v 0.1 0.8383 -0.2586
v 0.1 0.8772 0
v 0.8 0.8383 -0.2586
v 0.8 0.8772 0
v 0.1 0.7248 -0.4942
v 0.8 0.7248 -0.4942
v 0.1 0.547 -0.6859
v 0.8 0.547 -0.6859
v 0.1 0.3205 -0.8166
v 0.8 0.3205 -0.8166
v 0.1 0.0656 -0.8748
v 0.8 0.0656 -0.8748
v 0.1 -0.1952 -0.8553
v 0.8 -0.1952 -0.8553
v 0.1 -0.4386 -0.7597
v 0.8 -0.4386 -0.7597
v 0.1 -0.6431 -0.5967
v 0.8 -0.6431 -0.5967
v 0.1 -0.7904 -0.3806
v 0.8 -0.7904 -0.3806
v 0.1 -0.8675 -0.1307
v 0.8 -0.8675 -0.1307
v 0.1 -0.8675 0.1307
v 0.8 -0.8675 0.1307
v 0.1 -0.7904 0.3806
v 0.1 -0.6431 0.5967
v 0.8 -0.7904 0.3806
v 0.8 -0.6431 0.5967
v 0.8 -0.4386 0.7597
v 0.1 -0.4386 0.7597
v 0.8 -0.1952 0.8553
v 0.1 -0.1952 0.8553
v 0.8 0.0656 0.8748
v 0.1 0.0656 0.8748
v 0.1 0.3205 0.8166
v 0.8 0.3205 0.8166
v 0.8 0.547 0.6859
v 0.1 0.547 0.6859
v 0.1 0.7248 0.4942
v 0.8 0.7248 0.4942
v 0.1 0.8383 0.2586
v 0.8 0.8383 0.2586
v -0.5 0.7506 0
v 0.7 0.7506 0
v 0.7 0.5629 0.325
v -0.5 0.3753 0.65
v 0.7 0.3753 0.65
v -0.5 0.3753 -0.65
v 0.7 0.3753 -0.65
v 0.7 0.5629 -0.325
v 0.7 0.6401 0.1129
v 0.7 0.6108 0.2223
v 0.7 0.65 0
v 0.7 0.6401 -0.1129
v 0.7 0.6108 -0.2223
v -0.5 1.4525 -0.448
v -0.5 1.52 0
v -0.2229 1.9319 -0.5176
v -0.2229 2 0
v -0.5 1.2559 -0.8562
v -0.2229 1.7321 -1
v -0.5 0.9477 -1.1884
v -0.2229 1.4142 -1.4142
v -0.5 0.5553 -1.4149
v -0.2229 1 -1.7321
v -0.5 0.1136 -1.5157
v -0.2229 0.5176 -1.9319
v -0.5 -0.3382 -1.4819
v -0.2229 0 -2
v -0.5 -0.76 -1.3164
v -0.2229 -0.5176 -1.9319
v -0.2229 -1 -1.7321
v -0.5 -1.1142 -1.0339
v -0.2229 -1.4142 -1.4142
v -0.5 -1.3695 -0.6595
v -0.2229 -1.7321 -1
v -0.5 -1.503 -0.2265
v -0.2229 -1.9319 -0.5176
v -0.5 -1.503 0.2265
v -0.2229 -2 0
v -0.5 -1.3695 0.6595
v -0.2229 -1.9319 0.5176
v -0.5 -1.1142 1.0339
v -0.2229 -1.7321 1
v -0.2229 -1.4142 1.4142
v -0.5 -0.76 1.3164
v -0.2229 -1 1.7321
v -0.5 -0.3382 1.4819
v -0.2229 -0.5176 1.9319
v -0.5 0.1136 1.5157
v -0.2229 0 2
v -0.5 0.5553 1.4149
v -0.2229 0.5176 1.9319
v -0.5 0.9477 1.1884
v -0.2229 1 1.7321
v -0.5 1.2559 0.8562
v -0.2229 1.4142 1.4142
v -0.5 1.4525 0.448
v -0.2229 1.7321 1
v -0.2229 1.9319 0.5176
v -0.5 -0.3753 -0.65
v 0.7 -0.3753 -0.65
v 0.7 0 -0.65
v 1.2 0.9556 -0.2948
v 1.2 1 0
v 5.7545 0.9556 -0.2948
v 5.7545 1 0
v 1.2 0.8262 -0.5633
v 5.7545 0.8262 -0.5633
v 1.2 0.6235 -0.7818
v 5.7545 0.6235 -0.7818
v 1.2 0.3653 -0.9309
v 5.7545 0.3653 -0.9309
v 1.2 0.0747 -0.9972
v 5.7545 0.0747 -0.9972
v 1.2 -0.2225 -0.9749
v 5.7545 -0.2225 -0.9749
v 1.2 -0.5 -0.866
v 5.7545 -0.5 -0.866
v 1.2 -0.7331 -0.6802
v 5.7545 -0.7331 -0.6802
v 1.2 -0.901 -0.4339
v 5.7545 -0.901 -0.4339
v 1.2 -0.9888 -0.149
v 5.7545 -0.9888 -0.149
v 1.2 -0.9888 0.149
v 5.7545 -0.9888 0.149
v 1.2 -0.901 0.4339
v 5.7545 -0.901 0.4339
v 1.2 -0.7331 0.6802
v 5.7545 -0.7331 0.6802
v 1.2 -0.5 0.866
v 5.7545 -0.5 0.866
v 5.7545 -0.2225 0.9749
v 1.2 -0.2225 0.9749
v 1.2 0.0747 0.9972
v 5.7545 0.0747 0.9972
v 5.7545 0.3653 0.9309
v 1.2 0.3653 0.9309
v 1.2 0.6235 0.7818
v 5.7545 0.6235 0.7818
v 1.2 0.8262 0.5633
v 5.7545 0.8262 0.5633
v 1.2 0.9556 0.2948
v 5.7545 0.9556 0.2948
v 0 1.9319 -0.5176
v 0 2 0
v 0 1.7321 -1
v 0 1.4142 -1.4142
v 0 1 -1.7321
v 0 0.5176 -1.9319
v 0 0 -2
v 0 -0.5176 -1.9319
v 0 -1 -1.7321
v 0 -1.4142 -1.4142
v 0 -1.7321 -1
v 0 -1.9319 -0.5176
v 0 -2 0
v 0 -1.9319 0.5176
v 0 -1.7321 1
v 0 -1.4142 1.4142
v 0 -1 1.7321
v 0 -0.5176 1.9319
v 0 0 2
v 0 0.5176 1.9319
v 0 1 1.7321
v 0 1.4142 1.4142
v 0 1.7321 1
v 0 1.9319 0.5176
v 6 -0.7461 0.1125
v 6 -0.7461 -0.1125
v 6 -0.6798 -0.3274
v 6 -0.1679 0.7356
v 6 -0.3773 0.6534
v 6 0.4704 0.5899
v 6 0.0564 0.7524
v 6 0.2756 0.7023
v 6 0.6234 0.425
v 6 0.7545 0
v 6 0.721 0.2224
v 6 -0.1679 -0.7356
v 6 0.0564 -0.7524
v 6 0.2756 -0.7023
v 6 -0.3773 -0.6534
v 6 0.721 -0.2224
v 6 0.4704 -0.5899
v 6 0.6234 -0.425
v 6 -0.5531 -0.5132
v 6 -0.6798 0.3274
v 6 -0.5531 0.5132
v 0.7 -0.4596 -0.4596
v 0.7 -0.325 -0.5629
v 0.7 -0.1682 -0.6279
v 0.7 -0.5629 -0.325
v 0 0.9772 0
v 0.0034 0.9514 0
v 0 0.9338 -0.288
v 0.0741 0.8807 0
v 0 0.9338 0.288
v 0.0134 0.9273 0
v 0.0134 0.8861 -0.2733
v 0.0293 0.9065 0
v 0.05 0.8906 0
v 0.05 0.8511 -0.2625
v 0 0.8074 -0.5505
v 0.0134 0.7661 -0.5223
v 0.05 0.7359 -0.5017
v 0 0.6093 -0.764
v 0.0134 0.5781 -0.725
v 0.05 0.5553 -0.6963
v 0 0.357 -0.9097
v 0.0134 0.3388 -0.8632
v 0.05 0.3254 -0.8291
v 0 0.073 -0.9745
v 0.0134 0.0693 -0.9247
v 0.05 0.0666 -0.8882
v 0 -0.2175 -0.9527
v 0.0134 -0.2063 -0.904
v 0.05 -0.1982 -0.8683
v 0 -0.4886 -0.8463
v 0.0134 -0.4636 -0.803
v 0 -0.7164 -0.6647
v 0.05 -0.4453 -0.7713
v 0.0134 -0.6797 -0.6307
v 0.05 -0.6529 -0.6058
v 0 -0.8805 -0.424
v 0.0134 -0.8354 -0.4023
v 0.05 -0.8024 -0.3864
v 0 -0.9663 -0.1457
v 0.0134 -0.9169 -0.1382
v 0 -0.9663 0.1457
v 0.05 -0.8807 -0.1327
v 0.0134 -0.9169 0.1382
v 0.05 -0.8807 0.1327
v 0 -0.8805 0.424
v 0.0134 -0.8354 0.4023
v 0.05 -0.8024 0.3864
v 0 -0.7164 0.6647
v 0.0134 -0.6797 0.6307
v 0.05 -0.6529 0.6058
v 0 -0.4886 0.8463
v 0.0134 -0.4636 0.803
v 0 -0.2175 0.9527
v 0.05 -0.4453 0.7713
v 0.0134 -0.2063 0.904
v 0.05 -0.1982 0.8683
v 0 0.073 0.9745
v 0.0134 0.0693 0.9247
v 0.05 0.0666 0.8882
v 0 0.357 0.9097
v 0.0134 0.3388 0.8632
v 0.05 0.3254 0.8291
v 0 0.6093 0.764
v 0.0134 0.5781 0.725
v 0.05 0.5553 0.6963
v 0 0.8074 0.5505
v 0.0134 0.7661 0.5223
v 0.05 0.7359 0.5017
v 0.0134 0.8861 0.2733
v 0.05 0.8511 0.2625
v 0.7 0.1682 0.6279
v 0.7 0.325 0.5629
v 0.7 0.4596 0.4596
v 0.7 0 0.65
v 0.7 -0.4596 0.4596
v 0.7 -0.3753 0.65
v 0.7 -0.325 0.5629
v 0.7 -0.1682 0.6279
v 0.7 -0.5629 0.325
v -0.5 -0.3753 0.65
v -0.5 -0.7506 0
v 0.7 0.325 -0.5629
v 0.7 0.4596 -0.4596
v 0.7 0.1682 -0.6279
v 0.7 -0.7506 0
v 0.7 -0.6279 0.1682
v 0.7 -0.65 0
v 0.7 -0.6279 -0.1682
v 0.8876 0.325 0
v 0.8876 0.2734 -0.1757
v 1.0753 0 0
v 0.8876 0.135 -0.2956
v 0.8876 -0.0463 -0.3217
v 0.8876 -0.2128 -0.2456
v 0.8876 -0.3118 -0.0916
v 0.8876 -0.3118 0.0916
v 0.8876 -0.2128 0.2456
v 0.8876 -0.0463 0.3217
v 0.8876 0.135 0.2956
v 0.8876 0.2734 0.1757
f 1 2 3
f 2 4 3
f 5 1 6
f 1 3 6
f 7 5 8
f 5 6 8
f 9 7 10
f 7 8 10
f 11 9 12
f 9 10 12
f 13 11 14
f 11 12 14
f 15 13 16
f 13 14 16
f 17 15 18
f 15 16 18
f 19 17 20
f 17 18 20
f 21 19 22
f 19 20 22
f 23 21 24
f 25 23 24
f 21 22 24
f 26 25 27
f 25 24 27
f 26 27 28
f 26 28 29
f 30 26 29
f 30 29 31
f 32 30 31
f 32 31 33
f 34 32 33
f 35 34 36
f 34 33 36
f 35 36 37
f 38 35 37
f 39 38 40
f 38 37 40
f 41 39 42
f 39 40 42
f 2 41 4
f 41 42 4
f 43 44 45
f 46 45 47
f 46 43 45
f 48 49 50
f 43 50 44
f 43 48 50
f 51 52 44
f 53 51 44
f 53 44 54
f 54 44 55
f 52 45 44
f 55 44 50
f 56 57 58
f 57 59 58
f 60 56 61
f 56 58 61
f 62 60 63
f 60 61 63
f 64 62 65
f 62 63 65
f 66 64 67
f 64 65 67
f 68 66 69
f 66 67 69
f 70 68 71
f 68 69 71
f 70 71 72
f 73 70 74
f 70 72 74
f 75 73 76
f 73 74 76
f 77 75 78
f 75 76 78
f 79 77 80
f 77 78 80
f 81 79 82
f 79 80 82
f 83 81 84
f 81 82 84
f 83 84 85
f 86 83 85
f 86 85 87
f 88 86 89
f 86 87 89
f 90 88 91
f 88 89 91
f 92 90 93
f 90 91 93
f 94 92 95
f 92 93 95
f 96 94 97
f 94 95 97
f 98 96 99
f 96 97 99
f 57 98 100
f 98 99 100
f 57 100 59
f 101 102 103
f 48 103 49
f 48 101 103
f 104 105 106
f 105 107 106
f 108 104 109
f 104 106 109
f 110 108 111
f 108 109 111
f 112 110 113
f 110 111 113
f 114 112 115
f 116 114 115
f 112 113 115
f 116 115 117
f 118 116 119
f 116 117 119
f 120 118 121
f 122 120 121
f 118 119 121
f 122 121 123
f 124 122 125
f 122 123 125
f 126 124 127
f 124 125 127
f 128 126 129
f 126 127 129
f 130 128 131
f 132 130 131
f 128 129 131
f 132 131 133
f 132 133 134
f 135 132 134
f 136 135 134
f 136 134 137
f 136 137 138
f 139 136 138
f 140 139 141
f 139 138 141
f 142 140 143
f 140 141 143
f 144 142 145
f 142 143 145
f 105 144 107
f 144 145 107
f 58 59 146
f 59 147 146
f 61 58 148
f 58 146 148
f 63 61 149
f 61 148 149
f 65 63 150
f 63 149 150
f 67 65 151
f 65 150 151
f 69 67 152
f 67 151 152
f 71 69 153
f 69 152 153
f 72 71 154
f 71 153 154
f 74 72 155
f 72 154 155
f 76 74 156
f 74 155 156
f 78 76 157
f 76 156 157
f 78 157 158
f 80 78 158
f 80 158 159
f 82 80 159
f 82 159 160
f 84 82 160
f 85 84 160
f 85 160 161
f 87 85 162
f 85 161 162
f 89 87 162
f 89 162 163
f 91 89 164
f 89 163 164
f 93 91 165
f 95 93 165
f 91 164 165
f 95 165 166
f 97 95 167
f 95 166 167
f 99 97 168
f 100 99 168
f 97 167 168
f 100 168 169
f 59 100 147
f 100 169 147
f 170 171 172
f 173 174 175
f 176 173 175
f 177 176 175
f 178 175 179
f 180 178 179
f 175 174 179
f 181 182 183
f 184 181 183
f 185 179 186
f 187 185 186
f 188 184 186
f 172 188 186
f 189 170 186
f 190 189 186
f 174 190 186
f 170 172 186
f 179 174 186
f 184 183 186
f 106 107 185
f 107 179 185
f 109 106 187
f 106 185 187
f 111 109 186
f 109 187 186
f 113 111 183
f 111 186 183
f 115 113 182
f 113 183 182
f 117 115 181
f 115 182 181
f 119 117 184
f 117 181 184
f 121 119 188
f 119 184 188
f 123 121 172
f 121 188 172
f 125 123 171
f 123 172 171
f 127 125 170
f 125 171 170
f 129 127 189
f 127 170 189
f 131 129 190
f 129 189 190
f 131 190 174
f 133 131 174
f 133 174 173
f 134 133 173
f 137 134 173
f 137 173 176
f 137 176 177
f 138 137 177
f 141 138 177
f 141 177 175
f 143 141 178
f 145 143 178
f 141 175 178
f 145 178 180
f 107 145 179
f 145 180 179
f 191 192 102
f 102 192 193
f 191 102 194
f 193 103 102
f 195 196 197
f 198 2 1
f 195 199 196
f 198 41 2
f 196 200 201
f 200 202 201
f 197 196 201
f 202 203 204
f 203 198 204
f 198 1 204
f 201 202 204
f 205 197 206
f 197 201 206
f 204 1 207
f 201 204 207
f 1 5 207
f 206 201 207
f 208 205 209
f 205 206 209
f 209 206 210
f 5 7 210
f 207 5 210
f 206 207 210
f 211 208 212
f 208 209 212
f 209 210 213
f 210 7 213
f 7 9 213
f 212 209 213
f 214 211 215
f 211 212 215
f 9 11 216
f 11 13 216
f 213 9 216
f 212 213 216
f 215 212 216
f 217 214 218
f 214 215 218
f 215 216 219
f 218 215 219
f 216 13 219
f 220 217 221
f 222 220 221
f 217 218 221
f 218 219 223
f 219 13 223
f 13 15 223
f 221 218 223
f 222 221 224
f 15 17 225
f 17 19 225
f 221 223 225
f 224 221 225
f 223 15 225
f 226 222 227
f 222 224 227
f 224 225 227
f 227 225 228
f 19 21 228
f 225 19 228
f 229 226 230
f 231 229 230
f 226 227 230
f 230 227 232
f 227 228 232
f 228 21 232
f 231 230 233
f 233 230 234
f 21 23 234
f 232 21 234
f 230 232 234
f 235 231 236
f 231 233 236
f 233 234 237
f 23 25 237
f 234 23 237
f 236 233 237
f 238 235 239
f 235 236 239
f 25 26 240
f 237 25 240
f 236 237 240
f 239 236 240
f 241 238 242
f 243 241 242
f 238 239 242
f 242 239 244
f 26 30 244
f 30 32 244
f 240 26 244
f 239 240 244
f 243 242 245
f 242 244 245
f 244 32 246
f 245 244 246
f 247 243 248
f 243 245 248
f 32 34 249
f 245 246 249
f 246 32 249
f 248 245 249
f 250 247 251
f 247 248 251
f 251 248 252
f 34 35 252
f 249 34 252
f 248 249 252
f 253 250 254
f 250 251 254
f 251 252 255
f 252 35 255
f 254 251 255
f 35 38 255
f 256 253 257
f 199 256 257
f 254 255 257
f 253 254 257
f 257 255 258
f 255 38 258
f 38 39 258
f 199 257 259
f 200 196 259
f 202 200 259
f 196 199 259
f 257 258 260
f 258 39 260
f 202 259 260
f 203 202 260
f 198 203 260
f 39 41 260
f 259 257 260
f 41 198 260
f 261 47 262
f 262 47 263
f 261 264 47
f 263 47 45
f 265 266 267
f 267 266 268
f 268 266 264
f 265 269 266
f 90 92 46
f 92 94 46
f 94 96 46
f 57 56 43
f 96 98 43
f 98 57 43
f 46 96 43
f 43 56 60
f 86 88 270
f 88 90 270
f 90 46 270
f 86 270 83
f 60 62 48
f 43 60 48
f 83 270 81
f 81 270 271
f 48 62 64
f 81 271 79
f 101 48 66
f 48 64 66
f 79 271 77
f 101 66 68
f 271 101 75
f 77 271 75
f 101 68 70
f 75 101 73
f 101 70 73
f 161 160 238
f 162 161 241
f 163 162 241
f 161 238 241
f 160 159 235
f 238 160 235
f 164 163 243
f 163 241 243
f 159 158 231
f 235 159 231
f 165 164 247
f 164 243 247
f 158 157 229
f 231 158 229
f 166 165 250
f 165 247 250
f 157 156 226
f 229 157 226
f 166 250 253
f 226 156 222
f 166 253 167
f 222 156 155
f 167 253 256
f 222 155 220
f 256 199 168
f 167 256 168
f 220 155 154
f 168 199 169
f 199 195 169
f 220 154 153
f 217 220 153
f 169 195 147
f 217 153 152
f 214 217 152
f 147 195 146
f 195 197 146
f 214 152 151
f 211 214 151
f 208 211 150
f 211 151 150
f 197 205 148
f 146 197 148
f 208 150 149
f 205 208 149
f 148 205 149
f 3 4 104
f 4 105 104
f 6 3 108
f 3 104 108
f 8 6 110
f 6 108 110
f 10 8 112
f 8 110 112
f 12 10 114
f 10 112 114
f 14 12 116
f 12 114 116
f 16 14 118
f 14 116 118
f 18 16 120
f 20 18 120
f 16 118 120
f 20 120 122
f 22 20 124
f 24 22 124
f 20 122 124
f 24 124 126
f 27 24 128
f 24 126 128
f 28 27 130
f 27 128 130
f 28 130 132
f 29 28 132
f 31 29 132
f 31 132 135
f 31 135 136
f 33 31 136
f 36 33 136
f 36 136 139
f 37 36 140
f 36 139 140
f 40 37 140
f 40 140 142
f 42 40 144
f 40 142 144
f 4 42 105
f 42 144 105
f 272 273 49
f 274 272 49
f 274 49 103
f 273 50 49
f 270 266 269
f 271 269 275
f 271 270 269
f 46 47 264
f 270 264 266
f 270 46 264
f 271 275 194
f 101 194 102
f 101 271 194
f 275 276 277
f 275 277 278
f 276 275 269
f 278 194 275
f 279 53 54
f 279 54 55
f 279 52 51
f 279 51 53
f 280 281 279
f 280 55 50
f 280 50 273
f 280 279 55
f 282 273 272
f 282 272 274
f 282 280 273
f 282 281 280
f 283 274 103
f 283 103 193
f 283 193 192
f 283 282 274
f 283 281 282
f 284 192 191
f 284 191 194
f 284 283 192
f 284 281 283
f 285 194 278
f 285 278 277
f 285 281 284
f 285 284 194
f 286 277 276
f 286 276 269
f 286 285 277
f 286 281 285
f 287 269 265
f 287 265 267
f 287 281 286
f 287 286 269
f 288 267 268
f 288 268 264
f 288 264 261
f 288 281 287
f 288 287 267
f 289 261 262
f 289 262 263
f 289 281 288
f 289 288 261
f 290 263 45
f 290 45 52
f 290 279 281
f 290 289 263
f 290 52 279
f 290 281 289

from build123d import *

# Parameters (mm, degrees)
CUT_EXTRUDE1_DEPTH = 1.2


with BuildPart() as part:
    # Sketch1 → Revolve1 (revolve)
    with BuildSketch(Plane.XY):
        with BuildLine():
            Line((-0.5, 0), (-0.5, 1.52))
            Line((-0.5, 1.52), (-0.222871871, 2))
            Line((-0.222871871, 2), (0, 2))
            Line((0, 2), (0, 0.97725))
            ThreePointArc((0, 0.97725), (0.029289322, 0.906539322), (0.1, 0.87725))
            Line((0.1, 0.87725), (0.8, 0.87725))
            Line((0.8, 0.87725), (1.2, 1))
            Line((1.2, 1), (5.7545, 1))
            Line((5.7545, 1), (6, 0.7545))
            Line((6, 0.7545), (6, 0))
            Line((6, 0), (-0.5, 0))
        make_face()
    revolve(axis=Axis((6, 0, 0), (-1, 0, 0)))

    # Sketch2 → Cut-Revolve1 (revolve, cut)
    with BuildSketch(Plane.XY):
        Polygon((-0.5, 0), (-0.5, 0.65), (0.7, 0.65), (1.075277675, 0), align=None)
    revolve(axis=Axis((1.075277675, 0, 0), (-1, 0, 0)), mode=Mode.SUBTRACT)

    # Sketch3 → Cut-Extrude1 (cut)
    with BuildSketch(Plane(origin=(-0.5, 0, 0), x_dir=(0, 0, -1), z_dir=(1, 0, 0))):
        Polygon((-0.65, -0.375277675), (0, -0.75055535), (0.65, -0.375277675), (0.65, 0.375277675), (0, 0.75055535), (-0.65, 0.375277675), align=None)
    extrude(amount=CUT_EXTRUDE1_DEPTH, mode=Mode.SUBTRACT)


solid = part.part
